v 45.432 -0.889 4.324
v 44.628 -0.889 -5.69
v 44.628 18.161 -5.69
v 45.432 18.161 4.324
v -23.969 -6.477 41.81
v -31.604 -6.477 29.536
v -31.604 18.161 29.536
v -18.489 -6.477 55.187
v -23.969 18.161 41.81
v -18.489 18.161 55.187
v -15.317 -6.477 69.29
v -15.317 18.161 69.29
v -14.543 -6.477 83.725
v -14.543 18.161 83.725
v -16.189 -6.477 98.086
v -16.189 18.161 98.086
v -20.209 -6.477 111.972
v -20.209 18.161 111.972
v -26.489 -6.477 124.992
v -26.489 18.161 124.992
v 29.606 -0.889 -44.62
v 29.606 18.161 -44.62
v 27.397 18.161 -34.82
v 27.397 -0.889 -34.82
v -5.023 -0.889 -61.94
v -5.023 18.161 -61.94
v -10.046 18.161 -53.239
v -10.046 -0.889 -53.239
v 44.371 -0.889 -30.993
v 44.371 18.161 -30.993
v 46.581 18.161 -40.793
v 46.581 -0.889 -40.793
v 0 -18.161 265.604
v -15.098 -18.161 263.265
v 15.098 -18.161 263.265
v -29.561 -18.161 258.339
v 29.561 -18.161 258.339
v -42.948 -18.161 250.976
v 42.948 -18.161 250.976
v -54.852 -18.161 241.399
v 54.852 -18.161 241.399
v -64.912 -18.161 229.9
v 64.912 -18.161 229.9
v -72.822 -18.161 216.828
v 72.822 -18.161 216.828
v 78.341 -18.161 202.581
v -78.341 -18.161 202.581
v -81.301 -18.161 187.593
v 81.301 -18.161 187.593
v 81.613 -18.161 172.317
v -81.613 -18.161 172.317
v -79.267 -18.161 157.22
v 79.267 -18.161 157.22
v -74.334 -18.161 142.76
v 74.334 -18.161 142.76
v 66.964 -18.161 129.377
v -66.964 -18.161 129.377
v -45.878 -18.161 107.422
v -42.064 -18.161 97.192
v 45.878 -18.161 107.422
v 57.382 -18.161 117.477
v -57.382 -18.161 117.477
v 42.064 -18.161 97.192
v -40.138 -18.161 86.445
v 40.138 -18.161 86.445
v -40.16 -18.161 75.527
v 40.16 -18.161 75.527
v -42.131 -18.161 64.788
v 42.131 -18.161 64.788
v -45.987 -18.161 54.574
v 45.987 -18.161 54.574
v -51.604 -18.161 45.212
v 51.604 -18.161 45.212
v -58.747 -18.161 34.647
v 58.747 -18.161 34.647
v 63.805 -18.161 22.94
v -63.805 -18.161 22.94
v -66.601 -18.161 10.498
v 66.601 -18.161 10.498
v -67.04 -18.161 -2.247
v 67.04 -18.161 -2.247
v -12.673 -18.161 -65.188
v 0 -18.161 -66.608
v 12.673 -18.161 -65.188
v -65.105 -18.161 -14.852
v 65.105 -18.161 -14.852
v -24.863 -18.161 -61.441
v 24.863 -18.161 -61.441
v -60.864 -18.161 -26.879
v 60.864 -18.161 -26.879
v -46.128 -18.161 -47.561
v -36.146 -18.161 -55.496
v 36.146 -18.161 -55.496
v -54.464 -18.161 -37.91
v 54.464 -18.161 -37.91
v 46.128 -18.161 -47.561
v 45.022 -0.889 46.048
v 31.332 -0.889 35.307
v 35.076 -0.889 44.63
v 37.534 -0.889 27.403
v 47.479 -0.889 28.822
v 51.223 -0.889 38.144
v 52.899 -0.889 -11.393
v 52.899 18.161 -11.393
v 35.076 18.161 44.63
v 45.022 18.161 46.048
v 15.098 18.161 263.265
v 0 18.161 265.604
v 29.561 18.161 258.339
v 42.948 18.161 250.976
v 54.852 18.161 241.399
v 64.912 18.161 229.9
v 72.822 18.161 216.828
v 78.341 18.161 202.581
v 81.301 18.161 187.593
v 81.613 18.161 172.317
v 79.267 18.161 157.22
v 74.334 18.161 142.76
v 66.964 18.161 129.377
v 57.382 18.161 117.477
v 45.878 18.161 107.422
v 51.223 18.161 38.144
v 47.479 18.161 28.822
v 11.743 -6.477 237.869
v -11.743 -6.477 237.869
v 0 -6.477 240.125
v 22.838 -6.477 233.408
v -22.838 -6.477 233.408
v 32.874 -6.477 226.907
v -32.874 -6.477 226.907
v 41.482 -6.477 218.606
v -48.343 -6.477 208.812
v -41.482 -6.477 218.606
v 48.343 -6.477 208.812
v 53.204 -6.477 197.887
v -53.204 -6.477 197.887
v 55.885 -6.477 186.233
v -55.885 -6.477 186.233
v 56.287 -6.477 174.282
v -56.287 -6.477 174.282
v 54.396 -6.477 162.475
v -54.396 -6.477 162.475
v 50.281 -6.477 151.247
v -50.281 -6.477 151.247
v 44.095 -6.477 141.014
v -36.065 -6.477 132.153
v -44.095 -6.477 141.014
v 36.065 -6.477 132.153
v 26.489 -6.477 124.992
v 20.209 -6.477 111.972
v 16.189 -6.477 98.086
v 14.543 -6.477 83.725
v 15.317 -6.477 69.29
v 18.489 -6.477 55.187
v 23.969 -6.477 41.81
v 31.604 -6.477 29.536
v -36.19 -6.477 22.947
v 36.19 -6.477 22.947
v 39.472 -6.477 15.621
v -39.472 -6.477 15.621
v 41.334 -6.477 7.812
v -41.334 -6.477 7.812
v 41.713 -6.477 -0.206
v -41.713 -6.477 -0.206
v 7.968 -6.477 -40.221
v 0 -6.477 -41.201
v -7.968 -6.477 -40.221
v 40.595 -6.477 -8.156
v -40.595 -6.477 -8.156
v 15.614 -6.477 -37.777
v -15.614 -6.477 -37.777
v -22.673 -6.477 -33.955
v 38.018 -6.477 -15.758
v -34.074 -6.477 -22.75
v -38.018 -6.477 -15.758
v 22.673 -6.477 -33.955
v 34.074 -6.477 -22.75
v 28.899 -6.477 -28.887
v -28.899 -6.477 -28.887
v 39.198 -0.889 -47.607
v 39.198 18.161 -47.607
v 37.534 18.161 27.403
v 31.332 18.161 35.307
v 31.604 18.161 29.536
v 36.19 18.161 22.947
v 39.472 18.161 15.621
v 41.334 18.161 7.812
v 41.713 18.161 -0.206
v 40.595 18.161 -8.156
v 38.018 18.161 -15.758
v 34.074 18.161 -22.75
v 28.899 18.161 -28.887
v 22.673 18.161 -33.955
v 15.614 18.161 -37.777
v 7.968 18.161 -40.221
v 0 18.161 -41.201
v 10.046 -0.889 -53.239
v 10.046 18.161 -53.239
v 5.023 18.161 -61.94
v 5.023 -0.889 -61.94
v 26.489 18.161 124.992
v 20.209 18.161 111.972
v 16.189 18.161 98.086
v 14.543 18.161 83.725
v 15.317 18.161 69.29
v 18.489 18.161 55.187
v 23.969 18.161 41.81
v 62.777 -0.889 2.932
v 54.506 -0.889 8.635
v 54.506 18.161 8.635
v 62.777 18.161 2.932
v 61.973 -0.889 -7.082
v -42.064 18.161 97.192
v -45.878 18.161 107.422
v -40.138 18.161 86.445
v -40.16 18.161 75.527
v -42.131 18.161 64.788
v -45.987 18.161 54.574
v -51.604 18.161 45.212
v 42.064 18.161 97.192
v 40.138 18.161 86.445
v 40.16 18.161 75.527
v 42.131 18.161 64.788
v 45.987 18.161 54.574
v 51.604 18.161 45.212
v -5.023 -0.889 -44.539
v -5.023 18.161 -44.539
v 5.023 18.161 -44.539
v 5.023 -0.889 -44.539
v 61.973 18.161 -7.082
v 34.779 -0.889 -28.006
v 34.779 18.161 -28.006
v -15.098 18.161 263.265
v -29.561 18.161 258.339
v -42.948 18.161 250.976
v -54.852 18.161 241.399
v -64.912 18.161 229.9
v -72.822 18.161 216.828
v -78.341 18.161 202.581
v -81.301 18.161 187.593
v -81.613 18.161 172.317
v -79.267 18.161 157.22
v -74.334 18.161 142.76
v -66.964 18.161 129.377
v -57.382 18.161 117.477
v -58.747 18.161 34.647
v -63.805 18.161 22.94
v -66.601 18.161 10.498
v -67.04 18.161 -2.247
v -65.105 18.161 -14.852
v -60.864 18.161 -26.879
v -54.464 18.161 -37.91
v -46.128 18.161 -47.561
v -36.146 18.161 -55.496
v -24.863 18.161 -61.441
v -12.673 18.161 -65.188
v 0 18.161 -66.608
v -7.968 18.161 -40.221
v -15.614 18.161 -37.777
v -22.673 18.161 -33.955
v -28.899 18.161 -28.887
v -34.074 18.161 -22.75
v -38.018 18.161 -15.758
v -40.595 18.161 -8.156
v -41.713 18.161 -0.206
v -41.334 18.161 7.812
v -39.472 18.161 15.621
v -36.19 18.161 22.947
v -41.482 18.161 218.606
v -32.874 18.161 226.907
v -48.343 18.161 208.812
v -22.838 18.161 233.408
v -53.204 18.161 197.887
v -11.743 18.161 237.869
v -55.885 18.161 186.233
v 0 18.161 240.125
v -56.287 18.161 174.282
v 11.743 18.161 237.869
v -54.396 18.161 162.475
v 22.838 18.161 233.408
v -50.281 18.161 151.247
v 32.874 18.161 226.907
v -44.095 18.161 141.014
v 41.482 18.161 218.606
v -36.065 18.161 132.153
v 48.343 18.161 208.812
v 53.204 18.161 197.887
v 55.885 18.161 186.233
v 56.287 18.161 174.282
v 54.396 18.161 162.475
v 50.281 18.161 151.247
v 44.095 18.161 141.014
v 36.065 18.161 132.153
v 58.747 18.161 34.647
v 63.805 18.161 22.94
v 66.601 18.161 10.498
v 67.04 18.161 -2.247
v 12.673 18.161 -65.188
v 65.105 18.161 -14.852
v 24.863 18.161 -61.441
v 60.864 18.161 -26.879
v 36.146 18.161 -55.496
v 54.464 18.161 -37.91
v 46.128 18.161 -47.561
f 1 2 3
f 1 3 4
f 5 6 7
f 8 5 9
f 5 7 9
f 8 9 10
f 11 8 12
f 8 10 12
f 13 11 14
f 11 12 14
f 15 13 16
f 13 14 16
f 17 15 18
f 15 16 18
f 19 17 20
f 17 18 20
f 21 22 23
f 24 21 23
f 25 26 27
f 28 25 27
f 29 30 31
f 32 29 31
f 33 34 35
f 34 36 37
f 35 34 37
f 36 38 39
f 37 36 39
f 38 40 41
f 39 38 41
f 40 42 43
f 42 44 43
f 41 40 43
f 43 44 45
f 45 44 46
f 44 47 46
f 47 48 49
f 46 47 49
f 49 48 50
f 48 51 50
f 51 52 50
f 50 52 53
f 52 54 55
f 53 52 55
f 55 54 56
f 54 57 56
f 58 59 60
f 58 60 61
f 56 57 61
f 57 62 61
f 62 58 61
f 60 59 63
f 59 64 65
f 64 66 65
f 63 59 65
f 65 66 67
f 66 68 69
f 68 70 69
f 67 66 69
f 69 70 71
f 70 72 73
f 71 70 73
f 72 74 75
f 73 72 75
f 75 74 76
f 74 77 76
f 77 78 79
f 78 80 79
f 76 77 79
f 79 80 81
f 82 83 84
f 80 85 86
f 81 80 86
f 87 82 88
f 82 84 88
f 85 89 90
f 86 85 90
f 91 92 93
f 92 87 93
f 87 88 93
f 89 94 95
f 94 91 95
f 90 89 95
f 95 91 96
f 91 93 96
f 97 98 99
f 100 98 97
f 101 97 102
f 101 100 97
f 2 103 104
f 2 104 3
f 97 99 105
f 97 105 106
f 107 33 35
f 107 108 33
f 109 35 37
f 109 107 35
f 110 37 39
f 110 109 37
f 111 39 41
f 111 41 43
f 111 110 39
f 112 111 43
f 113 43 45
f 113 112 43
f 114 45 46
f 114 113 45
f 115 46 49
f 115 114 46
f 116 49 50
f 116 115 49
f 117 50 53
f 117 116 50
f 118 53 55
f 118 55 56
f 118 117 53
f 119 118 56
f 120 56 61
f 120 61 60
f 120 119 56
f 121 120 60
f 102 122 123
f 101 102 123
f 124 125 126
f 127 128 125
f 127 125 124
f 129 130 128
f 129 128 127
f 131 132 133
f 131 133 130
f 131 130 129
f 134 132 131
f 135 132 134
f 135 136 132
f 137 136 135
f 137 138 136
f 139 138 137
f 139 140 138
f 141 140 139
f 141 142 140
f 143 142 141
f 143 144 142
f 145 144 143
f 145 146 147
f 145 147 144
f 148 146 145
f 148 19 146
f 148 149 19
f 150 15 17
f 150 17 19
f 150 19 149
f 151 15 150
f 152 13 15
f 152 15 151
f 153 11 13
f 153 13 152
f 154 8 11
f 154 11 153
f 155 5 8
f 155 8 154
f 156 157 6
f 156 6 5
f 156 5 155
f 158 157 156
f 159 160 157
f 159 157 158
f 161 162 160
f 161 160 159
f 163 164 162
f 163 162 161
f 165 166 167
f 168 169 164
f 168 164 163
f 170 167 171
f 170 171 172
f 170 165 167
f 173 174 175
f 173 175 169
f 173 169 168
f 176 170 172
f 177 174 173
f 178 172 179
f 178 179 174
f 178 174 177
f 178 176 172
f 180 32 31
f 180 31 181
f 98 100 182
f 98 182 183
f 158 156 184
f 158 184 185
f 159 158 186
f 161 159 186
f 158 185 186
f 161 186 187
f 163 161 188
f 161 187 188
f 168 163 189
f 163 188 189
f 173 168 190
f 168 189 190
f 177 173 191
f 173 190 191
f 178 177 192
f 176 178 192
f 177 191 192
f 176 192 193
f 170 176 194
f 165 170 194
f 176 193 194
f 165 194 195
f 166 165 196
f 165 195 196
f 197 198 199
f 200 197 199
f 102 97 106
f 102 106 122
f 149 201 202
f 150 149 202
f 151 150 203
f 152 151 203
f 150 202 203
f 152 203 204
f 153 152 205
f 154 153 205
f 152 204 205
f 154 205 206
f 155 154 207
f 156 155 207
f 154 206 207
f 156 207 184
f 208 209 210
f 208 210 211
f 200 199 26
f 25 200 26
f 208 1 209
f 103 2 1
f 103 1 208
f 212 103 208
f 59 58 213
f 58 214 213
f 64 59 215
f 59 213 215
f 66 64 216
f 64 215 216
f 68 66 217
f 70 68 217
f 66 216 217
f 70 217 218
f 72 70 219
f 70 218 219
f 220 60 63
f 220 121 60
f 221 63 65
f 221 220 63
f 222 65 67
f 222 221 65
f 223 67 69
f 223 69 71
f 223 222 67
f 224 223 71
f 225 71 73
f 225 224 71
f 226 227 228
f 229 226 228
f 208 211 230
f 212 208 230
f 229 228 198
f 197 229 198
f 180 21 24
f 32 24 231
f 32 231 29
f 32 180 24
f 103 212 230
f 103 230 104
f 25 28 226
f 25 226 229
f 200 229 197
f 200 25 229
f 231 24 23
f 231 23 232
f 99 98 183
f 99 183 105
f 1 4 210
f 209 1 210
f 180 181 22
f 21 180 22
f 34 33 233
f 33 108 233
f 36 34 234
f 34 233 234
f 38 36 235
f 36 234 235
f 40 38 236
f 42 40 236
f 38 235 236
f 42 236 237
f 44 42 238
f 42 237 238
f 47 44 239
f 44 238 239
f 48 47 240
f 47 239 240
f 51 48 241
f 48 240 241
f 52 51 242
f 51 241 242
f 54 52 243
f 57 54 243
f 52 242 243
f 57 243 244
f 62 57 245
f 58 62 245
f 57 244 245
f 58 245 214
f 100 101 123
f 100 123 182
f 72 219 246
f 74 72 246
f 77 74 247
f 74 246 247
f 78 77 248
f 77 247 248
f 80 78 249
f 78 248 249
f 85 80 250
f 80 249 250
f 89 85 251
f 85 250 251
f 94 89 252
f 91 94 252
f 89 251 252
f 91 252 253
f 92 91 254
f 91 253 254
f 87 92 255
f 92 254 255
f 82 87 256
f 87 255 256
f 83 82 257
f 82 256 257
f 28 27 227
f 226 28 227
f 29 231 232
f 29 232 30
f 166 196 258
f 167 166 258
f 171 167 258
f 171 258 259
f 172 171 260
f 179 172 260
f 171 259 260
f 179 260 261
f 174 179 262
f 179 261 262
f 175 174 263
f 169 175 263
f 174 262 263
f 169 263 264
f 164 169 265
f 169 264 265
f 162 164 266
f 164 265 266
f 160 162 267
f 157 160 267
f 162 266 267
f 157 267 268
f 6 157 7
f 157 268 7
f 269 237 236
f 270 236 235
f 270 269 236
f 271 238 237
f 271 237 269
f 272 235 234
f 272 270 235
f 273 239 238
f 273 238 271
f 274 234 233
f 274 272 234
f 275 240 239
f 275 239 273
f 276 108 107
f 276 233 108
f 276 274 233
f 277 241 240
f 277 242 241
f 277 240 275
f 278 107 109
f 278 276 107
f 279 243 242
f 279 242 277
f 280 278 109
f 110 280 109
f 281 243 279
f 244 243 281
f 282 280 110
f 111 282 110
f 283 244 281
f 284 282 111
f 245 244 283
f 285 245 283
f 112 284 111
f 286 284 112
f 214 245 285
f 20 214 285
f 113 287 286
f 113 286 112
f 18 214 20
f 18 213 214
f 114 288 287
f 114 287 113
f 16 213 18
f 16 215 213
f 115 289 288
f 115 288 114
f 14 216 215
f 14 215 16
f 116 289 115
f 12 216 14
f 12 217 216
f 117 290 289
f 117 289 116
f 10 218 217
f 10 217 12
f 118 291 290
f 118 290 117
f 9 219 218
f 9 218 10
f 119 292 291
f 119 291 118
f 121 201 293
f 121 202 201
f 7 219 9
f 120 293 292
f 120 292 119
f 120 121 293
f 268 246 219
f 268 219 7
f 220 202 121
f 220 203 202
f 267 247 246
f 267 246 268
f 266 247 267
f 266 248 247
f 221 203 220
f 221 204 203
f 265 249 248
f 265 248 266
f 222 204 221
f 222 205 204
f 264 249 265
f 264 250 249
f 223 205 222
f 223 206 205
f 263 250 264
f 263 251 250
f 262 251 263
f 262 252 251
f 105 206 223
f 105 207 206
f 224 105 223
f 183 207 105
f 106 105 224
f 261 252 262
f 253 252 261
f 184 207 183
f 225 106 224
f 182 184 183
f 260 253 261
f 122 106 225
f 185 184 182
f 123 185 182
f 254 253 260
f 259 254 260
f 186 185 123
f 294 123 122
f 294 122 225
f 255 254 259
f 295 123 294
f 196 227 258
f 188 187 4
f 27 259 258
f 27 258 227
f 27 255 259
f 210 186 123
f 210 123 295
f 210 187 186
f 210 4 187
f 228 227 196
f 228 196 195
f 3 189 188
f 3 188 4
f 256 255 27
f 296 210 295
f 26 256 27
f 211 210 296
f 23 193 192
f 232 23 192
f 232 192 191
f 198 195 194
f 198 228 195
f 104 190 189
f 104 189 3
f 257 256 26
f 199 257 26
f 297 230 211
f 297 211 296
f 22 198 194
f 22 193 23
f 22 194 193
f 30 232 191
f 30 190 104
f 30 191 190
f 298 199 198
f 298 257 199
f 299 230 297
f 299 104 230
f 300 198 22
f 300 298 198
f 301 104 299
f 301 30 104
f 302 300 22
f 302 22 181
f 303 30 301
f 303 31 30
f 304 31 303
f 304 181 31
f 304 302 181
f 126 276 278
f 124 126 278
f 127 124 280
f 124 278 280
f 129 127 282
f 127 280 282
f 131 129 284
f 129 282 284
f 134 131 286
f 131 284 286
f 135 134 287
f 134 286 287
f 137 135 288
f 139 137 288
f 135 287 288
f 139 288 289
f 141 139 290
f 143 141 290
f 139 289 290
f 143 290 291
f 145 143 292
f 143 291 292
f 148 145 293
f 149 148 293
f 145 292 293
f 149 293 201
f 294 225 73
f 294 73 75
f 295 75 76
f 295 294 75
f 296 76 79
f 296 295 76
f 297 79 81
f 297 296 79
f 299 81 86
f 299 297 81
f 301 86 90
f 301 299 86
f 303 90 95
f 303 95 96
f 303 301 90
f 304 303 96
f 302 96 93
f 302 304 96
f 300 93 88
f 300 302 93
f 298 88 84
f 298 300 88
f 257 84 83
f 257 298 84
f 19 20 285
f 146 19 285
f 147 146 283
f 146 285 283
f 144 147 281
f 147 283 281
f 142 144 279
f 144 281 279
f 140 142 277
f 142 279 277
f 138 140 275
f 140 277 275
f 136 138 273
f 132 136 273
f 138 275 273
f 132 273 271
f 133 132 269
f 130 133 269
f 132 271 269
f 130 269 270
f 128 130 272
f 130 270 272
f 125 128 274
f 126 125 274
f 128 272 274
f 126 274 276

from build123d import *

# Parameters (mm, degrees)
BOSS_EXTRUDE1_DEPTH = 18.161
CUT_EXTRUDE1_DEPTH  = 24.638
CUT_EXTRUDE2_DEPTH  = 19.05
CRVPATTERN1_START   = -0.889
CRVPATTERN1_DEPTH   = 19.05


# Read off the part's stored shape, not the designer's step: CrvPattern1
with BuildPart() as part:
    # Sketch1 → Boss-Extrude1 (new, symmetric)
    with BuildSketch(Plane(origin=(0, 0, 0), x_dir=(1, 0, 0), z_dir=(0, 1, 0))):
        with BuildLine():
            Line((0, 66.607667907), (0, -265.604400607))
            ThreePointArc((0, -265.604400607), (-78.340784416, -202.581490406), (-45.87811803, -107.421934899))
            ThreePointArc((-45.87811803, -107.421934899), (-40.160322886, -75.527015006), (-51.603877928, -45.211604003))
            ThreePointArc((-51.603877928, -45.211604003), (-60.864208699, 26.879044906), (0, 66.607667907))
        make_face()
    boss_extrude1 = extrude(amount=BOSS_EXTRUDE1_DEPTH, both=True)

    # Mirror1: Boss-Extrude1 across plane
    add(boss_extrude1.mirror(Plane(origin=(0, 0, 0), x_dir=(0, 0, 1), z_dir=(1, 0, 0))))

    # Sketch2 → Cut-Extrude1 (cut)
    with BuildSketch(Plane(origin=(0, 18.161, 0), x_dir=(1, 0, 0), z_dir=(0, 1, 0))):
        with BuildLine():
            ThreePointArc((0, 41.200992494), (-38.018423714, 15.7584639), (-31.604351091, -29.535933937))
            ThreePointArc((-31.604351091, -29.535933937), (-14.627606963, -76.491037862), (-26.48852554, -124.99165885))
            ThreePointArc((-26.48852554, -124.99165885), (-54.824707805, -192.124773269), (0, -240.125249216))
            ThreePointArc((0, -240.125249216), (54.824707805, -192.124773269), (26.48852554, -124.99165885))
            ThreePointArc((26.48852554, -124.99165885), (14.627606963, -76.491037862), (31.604351091, -29.535933937))
            ThreePointArc((31.604351091, -29.535933937), (38.018423714, 15.7584639), (0, 41.200992494))
        make_face()
    extrude(amount=-CUT_EXTRUDE1_DEPTH, mode=Mode.SUBTRACT)

    # Sketch3 → Cut-Extrude2 (cut)
    with BuildSketch(Plane(origin=(0, 18.161, 0), x_dir=(1, 0, 0), z_dir=(0, 1, 0))):
        Polygon((10.046315092, 53.239317383), (5.023157546, 61.939681467), (-5.023157546, 61.939681467), (-10.046315092, 53.239317383), (-5.023157546, 44.538953299), (5.023157546, 44.538953299), align=None)
    extrude(amount=-CUT_EXTRUDE2_DEPTH, mode=Mode.SUBTRACT)

    # CrvPattern1 outline → CrvPattern1 (cut)
    with BuildSketch(Plane(origin=(0, 0, 0), x_dir=(1, 0, 0), z_dir=(0, 1, 0)).offset(CRVPATTERN1_START)):
        Polygon((37.533514674, -27.403244166), (31.332053305, -35.307061206), (35.076228964, -44.629592813), (45.021865992, -46.048307379), (51.223327362, -38.144490339), (47.479151703, -28.821958732), align=None)
        Polygon((44.628135866, 5.689936437), (45.431707419, -4.32418957), (54.505980714, -8.635339196), (62.776682456, -2.932362814), (61.973110904, 7.081763193), (52.898837609, 11.392912818), align=None)
        Polygon((27.396514919, 34.820049581), (34.77897318, 28.006257908), (44.371118995, 30.992758468), (46.580806549, 40.7930507), (39.198348288, 47.606842373), (29.606202473, 44.620341813), align=None)
    extrude(amount=CRVPATTERN1_DEPTH, mode=Mode.SUBTRACT)


solid = part.part
